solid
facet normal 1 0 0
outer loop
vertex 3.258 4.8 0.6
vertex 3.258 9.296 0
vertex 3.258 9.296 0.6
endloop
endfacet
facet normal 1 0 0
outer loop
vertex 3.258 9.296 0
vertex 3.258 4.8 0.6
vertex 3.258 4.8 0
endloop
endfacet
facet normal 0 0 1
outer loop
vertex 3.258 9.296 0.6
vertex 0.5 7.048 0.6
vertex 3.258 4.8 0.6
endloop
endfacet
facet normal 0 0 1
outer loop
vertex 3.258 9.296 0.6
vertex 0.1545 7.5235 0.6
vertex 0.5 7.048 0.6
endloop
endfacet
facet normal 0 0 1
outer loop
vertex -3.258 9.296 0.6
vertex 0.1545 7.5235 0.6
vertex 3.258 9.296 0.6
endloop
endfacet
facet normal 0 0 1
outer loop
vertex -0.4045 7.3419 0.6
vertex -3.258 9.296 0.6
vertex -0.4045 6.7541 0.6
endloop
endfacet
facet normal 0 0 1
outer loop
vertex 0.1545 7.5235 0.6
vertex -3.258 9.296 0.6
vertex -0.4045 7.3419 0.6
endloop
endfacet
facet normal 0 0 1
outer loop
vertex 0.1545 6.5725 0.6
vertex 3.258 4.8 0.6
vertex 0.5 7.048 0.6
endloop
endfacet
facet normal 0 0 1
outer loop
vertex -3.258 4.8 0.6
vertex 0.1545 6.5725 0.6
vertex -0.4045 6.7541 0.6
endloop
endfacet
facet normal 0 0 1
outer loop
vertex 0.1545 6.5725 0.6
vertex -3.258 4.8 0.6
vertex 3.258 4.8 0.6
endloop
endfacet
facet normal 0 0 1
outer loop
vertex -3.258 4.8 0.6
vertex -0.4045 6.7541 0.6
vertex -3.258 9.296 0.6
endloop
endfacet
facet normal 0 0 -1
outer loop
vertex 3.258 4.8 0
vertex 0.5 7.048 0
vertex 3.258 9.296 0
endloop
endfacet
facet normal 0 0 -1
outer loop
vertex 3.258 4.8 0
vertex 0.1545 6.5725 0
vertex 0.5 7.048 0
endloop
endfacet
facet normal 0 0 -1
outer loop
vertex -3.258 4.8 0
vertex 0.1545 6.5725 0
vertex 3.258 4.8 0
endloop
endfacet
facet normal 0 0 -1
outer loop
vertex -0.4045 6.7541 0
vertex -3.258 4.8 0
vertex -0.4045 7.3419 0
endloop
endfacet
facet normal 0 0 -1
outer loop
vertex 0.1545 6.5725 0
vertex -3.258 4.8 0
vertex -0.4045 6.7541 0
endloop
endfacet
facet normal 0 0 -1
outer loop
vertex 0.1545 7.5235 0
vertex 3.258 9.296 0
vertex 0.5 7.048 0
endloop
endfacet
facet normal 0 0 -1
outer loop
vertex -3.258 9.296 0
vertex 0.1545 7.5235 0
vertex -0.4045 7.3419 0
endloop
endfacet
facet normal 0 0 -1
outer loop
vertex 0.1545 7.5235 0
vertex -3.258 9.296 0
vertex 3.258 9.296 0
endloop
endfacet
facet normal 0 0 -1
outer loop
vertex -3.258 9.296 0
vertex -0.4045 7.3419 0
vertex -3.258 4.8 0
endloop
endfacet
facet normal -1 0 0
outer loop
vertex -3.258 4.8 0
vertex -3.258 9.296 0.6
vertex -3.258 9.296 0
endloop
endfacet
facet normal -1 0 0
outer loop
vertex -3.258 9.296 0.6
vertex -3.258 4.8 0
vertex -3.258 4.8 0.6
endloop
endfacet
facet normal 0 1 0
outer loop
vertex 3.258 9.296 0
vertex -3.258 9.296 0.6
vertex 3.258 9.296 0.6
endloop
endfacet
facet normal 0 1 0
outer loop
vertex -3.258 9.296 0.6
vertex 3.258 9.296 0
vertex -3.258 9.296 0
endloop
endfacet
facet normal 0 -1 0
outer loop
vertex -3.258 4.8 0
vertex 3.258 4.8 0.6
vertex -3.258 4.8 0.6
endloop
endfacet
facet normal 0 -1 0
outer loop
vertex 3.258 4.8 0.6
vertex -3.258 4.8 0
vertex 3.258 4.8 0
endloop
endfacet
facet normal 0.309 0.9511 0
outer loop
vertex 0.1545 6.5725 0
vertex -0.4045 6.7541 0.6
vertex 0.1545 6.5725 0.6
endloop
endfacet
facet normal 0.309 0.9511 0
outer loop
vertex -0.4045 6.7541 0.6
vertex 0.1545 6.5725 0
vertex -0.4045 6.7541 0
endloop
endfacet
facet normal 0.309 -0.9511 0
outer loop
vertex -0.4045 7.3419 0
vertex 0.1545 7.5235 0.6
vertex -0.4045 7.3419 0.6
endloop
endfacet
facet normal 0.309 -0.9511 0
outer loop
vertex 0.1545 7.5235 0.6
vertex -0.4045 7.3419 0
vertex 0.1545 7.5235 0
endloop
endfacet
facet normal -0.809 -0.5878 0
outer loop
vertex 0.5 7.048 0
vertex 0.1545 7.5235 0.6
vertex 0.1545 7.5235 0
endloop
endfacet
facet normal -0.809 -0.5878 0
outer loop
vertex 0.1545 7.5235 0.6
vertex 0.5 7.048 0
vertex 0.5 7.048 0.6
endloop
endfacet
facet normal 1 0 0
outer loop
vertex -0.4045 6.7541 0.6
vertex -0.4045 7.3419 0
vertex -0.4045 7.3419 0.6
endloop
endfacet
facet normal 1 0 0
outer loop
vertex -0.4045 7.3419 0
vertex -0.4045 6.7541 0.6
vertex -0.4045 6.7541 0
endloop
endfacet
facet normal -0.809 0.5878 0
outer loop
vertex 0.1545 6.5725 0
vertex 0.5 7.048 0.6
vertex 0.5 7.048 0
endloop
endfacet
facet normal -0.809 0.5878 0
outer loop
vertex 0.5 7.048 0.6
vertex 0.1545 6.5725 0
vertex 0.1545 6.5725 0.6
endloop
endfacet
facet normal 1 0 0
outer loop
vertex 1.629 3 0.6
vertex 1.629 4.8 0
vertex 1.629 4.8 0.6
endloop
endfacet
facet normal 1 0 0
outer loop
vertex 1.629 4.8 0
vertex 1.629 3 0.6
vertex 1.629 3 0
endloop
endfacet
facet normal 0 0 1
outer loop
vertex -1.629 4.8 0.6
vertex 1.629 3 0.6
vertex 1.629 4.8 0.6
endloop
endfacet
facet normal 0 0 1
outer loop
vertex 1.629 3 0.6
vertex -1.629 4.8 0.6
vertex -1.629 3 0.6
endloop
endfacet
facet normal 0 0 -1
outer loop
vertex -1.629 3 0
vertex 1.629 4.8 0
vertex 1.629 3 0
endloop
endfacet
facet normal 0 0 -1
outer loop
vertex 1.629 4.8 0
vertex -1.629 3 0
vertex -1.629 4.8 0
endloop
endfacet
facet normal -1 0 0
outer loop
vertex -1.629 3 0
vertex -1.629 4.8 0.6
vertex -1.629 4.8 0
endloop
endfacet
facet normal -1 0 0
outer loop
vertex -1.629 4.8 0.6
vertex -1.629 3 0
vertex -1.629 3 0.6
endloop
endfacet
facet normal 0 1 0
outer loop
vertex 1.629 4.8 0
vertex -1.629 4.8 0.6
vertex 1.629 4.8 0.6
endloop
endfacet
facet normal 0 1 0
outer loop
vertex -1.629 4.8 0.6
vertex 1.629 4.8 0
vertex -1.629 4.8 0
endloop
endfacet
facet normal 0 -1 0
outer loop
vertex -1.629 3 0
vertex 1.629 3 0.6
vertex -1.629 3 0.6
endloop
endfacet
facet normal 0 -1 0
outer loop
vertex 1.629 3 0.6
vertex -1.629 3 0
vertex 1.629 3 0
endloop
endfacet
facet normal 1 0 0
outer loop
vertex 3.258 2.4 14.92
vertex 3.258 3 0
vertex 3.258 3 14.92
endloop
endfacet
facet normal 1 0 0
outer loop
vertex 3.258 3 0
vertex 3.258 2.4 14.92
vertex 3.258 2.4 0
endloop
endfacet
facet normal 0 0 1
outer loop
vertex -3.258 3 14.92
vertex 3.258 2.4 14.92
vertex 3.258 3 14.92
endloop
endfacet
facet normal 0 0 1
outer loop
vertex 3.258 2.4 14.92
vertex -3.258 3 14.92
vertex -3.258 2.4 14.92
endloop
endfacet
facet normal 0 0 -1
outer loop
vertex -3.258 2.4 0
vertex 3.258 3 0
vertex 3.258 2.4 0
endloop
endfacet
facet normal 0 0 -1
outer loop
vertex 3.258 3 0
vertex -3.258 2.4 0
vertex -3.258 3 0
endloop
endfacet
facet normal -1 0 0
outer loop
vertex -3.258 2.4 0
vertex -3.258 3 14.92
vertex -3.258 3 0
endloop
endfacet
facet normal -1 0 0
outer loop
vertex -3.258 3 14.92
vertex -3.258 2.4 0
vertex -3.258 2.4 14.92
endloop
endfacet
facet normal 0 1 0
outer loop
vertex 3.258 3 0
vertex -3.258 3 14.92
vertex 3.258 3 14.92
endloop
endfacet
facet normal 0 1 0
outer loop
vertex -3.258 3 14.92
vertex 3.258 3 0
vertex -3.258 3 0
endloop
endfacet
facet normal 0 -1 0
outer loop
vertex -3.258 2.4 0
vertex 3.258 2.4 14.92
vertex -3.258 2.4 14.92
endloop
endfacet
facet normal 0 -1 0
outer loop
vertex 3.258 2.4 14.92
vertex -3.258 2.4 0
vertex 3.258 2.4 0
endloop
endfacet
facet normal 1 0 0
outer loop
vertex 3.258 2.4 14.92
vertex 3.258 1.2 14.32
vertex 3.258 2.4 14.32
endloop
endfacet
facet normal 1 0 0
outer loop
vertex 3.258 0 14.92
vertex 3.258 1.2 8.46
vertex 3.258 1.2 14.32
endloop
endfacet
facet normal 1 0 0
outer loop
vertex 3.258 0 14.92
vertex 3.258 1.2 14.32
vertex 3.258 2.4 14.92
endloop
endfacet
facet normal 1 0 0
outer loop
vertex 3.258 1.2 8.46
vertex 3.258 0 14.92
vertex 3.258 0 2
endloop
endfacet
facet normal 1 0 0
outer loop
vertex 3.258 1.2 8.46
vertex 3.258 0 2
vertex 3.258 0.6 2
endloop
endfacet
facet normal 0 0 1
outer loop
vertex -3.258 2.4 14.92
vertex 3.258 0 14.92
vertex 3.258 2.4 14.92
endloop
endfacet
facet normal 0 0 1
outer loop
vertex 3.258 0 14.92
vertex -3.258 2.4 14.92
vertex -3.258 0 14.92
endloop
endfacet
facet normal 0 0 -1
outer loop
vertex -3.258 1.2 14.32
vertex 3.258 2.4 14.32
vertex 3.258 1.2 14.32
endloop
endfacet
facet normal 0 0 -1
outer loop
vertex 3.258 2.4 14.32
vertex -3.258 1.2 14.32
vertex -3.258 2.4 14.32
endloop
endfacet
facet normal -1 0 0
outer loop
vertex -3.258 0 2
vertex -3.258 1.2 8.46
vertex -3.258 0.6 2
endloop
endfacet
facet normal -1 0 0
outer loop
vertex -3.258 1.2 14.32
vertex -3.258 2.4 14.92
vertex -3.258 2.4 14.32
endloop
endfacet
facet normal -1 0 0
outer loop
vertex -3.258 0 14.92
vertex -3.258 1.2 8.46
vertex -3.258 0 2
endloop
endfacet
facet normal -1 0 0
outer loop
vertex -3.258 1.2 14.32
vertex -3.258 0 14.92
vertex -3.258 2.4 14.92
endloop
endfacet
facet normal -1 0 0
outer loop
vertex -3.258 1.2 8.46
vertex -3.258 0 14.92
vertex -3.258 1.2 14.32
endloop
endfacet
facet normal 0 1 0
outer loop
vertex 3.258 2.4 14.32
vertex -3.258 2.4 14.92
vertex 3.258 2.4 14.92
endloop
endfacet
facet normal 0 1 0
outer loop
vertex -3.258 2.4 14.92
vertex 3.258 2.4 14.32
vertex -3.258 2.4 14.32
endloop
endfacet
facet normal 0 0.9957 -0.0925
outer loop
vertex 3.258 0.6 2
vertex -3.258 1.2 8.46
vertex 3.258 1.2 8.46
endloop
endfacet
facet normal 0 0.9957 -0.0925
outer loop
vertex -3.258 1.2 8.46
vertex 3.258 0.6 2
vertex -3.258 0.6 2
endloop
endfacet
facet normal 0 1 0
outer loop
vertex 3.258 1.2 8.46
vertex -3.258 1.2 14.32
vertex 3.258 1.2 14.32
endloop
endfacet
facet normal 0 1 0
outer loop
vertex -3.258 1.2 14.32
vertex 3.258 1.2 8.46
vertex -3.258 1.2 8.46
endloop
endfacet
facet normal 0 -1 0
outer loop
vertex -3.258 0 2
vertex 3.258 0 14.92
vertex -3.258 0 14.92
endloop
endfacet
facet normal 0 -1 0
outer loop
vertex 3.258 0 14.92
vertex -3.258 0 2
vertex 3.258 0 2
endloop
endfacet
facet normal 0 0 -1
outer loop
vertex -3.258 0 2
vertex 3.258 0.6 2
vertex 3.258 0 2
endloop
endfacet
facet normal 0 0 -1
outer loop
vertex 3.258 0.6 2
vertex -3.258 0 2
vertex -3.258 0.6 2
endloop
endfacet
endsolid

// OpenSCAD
/**
  * Module: Solder tab contact
  *
  * Author: Karim Aziiev <karim.aziiev@gmail.com>
  * License: GPL-3.0-or-later
  */

include <../../colors.scad>

use <../../lib/functions.scad>
use <../../lib/shapes3d.scad>
use <../../lib/transforms.scad>
use <../../lib/trapezoids.scad>
use <../spring.scad>

contact_width_factor = 0.362;
contact_thickness    = 0.6;

terminal_type        = "solder_tab"; // [coil_spring, solder_tab]

function solder_tab_contact_mount_w(battery_dia,
                                    contact_hole_d=1)
  = max(contact_width_factor * battery_dia,
        with_default(contact_hole_d, 1) + 2);

function solder_tab_contact_mount_outer_size(battery_dia,
                                             contact_hole_d=1,
                                             thickness=contact_thickness)
  = let (contact_w =
       solder_tab_contact_mount_w(battery_dia=battery_dia,
                                  contact_hole_d=contact_hole_d))
  [contact_w, contact_w * 0.69, with_default(thickness, contact_thickness)];

function solder_tab_outer_len(battery_dia,
                              contact_hole_d=1,
                              thickness=contact_thickness,
                              front_rear_thickness)
  = let (outer_size = solder_tab_contact_mount_outer_size(battery_dia=battery_dia,
                                                          contact_hole_d=contact_hole_d,
                                                          thickness=thickness))
  outer_size[1] + front_rear_thickness / 2;

module solder_tab_cutout(battery_dia,
                         thickness,
                         holder_height,
                         front_rear_thickness,
                         contact_hole_d=1,
                         inc_step=4) {
  contact_hole_d = with_default(contact_hole_d, 1);
  thickness = with_default(thickness, contact_thickness);
  inc_step = with_default(inc_step, 4);
  holder_height = with_default(holder_height, battery_dia);
  contact_w = solder_tab_contact_mount_w(battery_dia=battery_dia,
                                         contact_hole_d=contact_hole_d);
  outer_size = [contact_w * 0.5,
                (front_rear_thickness / 2) - 0.5,
                holder_height];

  inner_cutout_size = [contact_w * 0.92,
                       (front_rear_thickness / 2),
                       max(1, holder_height - 2)];

  hook_trapezoid_bottom = 0.2 * holder_height;
  hook_trapezoid_top = 0.79 * hook_trapezoid_bottom;

  outer_bottom_cutout_size = [hook_trapezoid_bottom,
                              inner_cutout_size[1],
                              inner_cutout_size[2]];

  inner_hook_cutout_size = [hook_trapezoid_bottom,
                            hook_trapezoid_top,
                            0.5]; // trapezoid bottom, top and height
  outer_hook_cutout_size = [hook_trapezoid_bottom,
                            hook_trapezoid_top,
                            1.5]; // trapezoid bottom, top and height

  outer_hook_y_position = outer_size[2] / 2;
  inner_hook_y_position = inner_cutout_size[2] - inner_hook_cutout_size[0]/ 2;

  outer_thickness = outer_size[1] + inc_step;
  inner_thickness = inner_cutout_size[1] + inc_step;
  bottom_outer_thickness = outer_bottom_cutout_size[1] + inc_step;

  module contact_cutout_base(size,
                             hook_cutout_size,
                             hook_y_position,
                             inc_step=0) {
    b = hook_cutout_size[0];
    t = hook_cutout_size[1];
    h = hook_cutout_size[2];
    w = size[0];
    thickness = size[1];
    union() {
      translate([0, 0, inc_step != 0 ? (-inc_step / 2) : 0]) {
        cuboid(size=[size[0], thickness, size[2] + inc_step]);
      }
      mirror_copy([1, 0, 0]) {
        translate([-h / 2 - w / 2, 0, hook_y_position]) {
          rotate([0, 90, 90]) {
            linear_extrude(height=thickness, center=true) {
              trapezoid(b=b, t=t, h=h, center=true);
            }
          }
        }
      }
    }
  }

  union() {
    cube([contact_w,
          thickness,
          holder_height + 1],
         center=true);
    translate([0,
               -inner_cutout_size[1] / 2
               + front_rear_thickness / 2
               + inc_step / 2,
               holder_height - inner_cutout_size[2]]) {
      contact_cutout_base(size=[inner_cutout_size[0],
                                inner_thickness,
                                inner_cutout_size[2]
                                + inc_step],
                          hook_cutout_size=inner_hook_cutout_size,
                          hook_y_position=inner_hook_y_position);
    }
    translate([0,
               outer_size[1] / 2 - front_rear_thickness / 2 - inc_step / 2,
               0]) {
      contact_cutout_base(size=[outer_size[0],
                                outer_thickness,
                                outer_size[2] + inc_step],
                          hook_cutout_size=outer_hook_cutout_size,
                          hook_y_position=outer_hook_y_position);
    }
    translate([0,
               outer_bottom_cutout_size[1] / 2
               - front_rear_thickness / 2
               - inc_step / 2,
               -inc_step]) {
      cuboid(size=[outer_bottom_cutout_size[0],
                   bottom_outer_thickness,
                   outer_bottom_cutout_size[2] + inc_step]);
    }
  }
}

module battery_holder_solder_tab_contact(battery_dia=18,
                                         thickness=contact_thickness,
                                         holder_height=14.92,
                                         front_rear_thickness,
                                         contact_hole_d=1,
                                         angle = 0) {

  holder_height = with_default(holder_height, battery_dia);

  width = solder_tab_contact_mount_w(battery_dia=battery_dia,
                                     contact_hole_d=contact_hole_d);
  outer_size = [width * 0.5,
                (front_rear_thickness / 2) - 0.5,
                holder_height];

  contact_mount_bottom_size =
    solder_tab_contact_mount_outer_size(battery_dia=battery_dia,
                                        contact_hole_d=contact_hole_d);
  inner_cutout_size = [width * 0.92,
                       (front_rear_thickness / 2),
                       max(1, holder_height - 2)];

  half_of_front_thickness = front_rear_thickness / 2;
  half_of_inner_cutout_h = inner_cutout_size[2] / 2;

  bbox = rot_x_bbox_align([width, thickness,
                           half_of_inner_cutout_h],
                          angle=angle);

  union() {
    hull() {
      translate([0, bbox[2] + thickness, holder_height - bbox[5]]) {
        rotate([-angle, 0, 0]) {
          translate([0, 0, 0]) {
            cuboid([width, thickness, half_of_inner_cutout_h],
                   anchor=[0, 1, 1]);
          }
        }
      }
      translate([0, 0, holder_height - bbox[5] * 2]) {
        rotate([angle, 0, 0]) {
          translate([0, 0, 0]) {
            cuboid([width, thickness, half_of_inner_cutout_h],
                   anchor=[0, 1, 1]);
          }
        }
      }
    }

    translate([0, 0, holder_height - inner_cutout_size[2]]) {
      cuboid([width, thickness, inner_cutout_size[2]], anchor=[0, 1, 1]);
    }

    translate([0, thickness, 0]) {
      translate([0, 0, holder_height - thickness]) {
        cuboid([width, half_of_front_thickness, thickness], anchor=[0, 1, 1]);
      }
      translate([0, half_of_front_thickness, 0]) {
        cuboid([width, thickness, holder_height], anchor=[0, 1, 1]);
        translate([0, thickness, 0]) {
          cuboid([outer_size[0], half_of_front_thickness, thickness],
                 anchor=[0, 1, 1]);
          translate([0, half_of_front_thickness, 0]) {
            difference() {
              cuboid(contact_mount_bottom_size, anchor=[0, 1, 1]);
              translate([0, contact_mount_bottom_size[1] / 2, -0.5]) {
                cylinder(r=contact_hole_d / 2, h=thickness + 1);
              }
            }
          }
        }
      }
    }
  }
}

module battery_holder_contact(terminal_type=terminal_type,
                              battery_len=65,
                              battery_dia=18,
                              thickness=contact_thickness,
                              holder_height=14.92,
                              bottom_thickness=1.2,
                              front_rear_thickness=3.6,
                              use_spring=true,
                              contact_color,
                              coil_spring_d,
                              spring_color,
                              contact_hole_d=1) {
  is_solder_tab = terminal_type == "solder_tab";
  coil_spring_d = min(5, with_default(0.27 * battery_dia));
  thickness = with_default(thickness, contact_thickness);
  contact_hole_d = with_default(contact_hole_d, 1);

  contact_color = with_default(contact_color, metallic_yellow_1);

  battery_y_center_pos = battery_dia / 2 + bottom_thickness;

  union() {
    if (is_solder_tab) {
      color(contact_color, alpha=1) {
        battery_holder_solder_tab_contact(battery_dia=battery_dia,
                                          thickness=thickness,
                                          holder_height=holder_height,
                                          front_rear_thickness=front_rear_thickness,
                                          contact_hole_d=contact_hole_d);
      }
    } else {
      translate([0,
                 -thickness,
                 battery_y_center_pos]) {
        color(contact_color, alpha=1) {
          rotate([-90, 0, 0]) {
            cylinder(d=coil_spring_d,
                     h=front_rear_thickness + thickness * 2);
          }
        }
        if (use_spring) {
          spring_len = min(8, 0.1 * battery_len);
          spring_d1 = battery_dia * 0.6;
          spring_d2 = spring_d1 * 0.5;
          color(with_default(spring_color, metallic_silver_1), alpha=1) {
            translate([0, 1, 0]) {
              rotate([90, 0, 0]) {
                spring(d1=spring_d1,
                       d2=spring_d2,
                       wire=thickness,
                       turns=spring_len,
                       pitch=spring_len * 0.3);
              }
            }
          }
        }
      }
    }
  }
}

battery_holder_contact();
